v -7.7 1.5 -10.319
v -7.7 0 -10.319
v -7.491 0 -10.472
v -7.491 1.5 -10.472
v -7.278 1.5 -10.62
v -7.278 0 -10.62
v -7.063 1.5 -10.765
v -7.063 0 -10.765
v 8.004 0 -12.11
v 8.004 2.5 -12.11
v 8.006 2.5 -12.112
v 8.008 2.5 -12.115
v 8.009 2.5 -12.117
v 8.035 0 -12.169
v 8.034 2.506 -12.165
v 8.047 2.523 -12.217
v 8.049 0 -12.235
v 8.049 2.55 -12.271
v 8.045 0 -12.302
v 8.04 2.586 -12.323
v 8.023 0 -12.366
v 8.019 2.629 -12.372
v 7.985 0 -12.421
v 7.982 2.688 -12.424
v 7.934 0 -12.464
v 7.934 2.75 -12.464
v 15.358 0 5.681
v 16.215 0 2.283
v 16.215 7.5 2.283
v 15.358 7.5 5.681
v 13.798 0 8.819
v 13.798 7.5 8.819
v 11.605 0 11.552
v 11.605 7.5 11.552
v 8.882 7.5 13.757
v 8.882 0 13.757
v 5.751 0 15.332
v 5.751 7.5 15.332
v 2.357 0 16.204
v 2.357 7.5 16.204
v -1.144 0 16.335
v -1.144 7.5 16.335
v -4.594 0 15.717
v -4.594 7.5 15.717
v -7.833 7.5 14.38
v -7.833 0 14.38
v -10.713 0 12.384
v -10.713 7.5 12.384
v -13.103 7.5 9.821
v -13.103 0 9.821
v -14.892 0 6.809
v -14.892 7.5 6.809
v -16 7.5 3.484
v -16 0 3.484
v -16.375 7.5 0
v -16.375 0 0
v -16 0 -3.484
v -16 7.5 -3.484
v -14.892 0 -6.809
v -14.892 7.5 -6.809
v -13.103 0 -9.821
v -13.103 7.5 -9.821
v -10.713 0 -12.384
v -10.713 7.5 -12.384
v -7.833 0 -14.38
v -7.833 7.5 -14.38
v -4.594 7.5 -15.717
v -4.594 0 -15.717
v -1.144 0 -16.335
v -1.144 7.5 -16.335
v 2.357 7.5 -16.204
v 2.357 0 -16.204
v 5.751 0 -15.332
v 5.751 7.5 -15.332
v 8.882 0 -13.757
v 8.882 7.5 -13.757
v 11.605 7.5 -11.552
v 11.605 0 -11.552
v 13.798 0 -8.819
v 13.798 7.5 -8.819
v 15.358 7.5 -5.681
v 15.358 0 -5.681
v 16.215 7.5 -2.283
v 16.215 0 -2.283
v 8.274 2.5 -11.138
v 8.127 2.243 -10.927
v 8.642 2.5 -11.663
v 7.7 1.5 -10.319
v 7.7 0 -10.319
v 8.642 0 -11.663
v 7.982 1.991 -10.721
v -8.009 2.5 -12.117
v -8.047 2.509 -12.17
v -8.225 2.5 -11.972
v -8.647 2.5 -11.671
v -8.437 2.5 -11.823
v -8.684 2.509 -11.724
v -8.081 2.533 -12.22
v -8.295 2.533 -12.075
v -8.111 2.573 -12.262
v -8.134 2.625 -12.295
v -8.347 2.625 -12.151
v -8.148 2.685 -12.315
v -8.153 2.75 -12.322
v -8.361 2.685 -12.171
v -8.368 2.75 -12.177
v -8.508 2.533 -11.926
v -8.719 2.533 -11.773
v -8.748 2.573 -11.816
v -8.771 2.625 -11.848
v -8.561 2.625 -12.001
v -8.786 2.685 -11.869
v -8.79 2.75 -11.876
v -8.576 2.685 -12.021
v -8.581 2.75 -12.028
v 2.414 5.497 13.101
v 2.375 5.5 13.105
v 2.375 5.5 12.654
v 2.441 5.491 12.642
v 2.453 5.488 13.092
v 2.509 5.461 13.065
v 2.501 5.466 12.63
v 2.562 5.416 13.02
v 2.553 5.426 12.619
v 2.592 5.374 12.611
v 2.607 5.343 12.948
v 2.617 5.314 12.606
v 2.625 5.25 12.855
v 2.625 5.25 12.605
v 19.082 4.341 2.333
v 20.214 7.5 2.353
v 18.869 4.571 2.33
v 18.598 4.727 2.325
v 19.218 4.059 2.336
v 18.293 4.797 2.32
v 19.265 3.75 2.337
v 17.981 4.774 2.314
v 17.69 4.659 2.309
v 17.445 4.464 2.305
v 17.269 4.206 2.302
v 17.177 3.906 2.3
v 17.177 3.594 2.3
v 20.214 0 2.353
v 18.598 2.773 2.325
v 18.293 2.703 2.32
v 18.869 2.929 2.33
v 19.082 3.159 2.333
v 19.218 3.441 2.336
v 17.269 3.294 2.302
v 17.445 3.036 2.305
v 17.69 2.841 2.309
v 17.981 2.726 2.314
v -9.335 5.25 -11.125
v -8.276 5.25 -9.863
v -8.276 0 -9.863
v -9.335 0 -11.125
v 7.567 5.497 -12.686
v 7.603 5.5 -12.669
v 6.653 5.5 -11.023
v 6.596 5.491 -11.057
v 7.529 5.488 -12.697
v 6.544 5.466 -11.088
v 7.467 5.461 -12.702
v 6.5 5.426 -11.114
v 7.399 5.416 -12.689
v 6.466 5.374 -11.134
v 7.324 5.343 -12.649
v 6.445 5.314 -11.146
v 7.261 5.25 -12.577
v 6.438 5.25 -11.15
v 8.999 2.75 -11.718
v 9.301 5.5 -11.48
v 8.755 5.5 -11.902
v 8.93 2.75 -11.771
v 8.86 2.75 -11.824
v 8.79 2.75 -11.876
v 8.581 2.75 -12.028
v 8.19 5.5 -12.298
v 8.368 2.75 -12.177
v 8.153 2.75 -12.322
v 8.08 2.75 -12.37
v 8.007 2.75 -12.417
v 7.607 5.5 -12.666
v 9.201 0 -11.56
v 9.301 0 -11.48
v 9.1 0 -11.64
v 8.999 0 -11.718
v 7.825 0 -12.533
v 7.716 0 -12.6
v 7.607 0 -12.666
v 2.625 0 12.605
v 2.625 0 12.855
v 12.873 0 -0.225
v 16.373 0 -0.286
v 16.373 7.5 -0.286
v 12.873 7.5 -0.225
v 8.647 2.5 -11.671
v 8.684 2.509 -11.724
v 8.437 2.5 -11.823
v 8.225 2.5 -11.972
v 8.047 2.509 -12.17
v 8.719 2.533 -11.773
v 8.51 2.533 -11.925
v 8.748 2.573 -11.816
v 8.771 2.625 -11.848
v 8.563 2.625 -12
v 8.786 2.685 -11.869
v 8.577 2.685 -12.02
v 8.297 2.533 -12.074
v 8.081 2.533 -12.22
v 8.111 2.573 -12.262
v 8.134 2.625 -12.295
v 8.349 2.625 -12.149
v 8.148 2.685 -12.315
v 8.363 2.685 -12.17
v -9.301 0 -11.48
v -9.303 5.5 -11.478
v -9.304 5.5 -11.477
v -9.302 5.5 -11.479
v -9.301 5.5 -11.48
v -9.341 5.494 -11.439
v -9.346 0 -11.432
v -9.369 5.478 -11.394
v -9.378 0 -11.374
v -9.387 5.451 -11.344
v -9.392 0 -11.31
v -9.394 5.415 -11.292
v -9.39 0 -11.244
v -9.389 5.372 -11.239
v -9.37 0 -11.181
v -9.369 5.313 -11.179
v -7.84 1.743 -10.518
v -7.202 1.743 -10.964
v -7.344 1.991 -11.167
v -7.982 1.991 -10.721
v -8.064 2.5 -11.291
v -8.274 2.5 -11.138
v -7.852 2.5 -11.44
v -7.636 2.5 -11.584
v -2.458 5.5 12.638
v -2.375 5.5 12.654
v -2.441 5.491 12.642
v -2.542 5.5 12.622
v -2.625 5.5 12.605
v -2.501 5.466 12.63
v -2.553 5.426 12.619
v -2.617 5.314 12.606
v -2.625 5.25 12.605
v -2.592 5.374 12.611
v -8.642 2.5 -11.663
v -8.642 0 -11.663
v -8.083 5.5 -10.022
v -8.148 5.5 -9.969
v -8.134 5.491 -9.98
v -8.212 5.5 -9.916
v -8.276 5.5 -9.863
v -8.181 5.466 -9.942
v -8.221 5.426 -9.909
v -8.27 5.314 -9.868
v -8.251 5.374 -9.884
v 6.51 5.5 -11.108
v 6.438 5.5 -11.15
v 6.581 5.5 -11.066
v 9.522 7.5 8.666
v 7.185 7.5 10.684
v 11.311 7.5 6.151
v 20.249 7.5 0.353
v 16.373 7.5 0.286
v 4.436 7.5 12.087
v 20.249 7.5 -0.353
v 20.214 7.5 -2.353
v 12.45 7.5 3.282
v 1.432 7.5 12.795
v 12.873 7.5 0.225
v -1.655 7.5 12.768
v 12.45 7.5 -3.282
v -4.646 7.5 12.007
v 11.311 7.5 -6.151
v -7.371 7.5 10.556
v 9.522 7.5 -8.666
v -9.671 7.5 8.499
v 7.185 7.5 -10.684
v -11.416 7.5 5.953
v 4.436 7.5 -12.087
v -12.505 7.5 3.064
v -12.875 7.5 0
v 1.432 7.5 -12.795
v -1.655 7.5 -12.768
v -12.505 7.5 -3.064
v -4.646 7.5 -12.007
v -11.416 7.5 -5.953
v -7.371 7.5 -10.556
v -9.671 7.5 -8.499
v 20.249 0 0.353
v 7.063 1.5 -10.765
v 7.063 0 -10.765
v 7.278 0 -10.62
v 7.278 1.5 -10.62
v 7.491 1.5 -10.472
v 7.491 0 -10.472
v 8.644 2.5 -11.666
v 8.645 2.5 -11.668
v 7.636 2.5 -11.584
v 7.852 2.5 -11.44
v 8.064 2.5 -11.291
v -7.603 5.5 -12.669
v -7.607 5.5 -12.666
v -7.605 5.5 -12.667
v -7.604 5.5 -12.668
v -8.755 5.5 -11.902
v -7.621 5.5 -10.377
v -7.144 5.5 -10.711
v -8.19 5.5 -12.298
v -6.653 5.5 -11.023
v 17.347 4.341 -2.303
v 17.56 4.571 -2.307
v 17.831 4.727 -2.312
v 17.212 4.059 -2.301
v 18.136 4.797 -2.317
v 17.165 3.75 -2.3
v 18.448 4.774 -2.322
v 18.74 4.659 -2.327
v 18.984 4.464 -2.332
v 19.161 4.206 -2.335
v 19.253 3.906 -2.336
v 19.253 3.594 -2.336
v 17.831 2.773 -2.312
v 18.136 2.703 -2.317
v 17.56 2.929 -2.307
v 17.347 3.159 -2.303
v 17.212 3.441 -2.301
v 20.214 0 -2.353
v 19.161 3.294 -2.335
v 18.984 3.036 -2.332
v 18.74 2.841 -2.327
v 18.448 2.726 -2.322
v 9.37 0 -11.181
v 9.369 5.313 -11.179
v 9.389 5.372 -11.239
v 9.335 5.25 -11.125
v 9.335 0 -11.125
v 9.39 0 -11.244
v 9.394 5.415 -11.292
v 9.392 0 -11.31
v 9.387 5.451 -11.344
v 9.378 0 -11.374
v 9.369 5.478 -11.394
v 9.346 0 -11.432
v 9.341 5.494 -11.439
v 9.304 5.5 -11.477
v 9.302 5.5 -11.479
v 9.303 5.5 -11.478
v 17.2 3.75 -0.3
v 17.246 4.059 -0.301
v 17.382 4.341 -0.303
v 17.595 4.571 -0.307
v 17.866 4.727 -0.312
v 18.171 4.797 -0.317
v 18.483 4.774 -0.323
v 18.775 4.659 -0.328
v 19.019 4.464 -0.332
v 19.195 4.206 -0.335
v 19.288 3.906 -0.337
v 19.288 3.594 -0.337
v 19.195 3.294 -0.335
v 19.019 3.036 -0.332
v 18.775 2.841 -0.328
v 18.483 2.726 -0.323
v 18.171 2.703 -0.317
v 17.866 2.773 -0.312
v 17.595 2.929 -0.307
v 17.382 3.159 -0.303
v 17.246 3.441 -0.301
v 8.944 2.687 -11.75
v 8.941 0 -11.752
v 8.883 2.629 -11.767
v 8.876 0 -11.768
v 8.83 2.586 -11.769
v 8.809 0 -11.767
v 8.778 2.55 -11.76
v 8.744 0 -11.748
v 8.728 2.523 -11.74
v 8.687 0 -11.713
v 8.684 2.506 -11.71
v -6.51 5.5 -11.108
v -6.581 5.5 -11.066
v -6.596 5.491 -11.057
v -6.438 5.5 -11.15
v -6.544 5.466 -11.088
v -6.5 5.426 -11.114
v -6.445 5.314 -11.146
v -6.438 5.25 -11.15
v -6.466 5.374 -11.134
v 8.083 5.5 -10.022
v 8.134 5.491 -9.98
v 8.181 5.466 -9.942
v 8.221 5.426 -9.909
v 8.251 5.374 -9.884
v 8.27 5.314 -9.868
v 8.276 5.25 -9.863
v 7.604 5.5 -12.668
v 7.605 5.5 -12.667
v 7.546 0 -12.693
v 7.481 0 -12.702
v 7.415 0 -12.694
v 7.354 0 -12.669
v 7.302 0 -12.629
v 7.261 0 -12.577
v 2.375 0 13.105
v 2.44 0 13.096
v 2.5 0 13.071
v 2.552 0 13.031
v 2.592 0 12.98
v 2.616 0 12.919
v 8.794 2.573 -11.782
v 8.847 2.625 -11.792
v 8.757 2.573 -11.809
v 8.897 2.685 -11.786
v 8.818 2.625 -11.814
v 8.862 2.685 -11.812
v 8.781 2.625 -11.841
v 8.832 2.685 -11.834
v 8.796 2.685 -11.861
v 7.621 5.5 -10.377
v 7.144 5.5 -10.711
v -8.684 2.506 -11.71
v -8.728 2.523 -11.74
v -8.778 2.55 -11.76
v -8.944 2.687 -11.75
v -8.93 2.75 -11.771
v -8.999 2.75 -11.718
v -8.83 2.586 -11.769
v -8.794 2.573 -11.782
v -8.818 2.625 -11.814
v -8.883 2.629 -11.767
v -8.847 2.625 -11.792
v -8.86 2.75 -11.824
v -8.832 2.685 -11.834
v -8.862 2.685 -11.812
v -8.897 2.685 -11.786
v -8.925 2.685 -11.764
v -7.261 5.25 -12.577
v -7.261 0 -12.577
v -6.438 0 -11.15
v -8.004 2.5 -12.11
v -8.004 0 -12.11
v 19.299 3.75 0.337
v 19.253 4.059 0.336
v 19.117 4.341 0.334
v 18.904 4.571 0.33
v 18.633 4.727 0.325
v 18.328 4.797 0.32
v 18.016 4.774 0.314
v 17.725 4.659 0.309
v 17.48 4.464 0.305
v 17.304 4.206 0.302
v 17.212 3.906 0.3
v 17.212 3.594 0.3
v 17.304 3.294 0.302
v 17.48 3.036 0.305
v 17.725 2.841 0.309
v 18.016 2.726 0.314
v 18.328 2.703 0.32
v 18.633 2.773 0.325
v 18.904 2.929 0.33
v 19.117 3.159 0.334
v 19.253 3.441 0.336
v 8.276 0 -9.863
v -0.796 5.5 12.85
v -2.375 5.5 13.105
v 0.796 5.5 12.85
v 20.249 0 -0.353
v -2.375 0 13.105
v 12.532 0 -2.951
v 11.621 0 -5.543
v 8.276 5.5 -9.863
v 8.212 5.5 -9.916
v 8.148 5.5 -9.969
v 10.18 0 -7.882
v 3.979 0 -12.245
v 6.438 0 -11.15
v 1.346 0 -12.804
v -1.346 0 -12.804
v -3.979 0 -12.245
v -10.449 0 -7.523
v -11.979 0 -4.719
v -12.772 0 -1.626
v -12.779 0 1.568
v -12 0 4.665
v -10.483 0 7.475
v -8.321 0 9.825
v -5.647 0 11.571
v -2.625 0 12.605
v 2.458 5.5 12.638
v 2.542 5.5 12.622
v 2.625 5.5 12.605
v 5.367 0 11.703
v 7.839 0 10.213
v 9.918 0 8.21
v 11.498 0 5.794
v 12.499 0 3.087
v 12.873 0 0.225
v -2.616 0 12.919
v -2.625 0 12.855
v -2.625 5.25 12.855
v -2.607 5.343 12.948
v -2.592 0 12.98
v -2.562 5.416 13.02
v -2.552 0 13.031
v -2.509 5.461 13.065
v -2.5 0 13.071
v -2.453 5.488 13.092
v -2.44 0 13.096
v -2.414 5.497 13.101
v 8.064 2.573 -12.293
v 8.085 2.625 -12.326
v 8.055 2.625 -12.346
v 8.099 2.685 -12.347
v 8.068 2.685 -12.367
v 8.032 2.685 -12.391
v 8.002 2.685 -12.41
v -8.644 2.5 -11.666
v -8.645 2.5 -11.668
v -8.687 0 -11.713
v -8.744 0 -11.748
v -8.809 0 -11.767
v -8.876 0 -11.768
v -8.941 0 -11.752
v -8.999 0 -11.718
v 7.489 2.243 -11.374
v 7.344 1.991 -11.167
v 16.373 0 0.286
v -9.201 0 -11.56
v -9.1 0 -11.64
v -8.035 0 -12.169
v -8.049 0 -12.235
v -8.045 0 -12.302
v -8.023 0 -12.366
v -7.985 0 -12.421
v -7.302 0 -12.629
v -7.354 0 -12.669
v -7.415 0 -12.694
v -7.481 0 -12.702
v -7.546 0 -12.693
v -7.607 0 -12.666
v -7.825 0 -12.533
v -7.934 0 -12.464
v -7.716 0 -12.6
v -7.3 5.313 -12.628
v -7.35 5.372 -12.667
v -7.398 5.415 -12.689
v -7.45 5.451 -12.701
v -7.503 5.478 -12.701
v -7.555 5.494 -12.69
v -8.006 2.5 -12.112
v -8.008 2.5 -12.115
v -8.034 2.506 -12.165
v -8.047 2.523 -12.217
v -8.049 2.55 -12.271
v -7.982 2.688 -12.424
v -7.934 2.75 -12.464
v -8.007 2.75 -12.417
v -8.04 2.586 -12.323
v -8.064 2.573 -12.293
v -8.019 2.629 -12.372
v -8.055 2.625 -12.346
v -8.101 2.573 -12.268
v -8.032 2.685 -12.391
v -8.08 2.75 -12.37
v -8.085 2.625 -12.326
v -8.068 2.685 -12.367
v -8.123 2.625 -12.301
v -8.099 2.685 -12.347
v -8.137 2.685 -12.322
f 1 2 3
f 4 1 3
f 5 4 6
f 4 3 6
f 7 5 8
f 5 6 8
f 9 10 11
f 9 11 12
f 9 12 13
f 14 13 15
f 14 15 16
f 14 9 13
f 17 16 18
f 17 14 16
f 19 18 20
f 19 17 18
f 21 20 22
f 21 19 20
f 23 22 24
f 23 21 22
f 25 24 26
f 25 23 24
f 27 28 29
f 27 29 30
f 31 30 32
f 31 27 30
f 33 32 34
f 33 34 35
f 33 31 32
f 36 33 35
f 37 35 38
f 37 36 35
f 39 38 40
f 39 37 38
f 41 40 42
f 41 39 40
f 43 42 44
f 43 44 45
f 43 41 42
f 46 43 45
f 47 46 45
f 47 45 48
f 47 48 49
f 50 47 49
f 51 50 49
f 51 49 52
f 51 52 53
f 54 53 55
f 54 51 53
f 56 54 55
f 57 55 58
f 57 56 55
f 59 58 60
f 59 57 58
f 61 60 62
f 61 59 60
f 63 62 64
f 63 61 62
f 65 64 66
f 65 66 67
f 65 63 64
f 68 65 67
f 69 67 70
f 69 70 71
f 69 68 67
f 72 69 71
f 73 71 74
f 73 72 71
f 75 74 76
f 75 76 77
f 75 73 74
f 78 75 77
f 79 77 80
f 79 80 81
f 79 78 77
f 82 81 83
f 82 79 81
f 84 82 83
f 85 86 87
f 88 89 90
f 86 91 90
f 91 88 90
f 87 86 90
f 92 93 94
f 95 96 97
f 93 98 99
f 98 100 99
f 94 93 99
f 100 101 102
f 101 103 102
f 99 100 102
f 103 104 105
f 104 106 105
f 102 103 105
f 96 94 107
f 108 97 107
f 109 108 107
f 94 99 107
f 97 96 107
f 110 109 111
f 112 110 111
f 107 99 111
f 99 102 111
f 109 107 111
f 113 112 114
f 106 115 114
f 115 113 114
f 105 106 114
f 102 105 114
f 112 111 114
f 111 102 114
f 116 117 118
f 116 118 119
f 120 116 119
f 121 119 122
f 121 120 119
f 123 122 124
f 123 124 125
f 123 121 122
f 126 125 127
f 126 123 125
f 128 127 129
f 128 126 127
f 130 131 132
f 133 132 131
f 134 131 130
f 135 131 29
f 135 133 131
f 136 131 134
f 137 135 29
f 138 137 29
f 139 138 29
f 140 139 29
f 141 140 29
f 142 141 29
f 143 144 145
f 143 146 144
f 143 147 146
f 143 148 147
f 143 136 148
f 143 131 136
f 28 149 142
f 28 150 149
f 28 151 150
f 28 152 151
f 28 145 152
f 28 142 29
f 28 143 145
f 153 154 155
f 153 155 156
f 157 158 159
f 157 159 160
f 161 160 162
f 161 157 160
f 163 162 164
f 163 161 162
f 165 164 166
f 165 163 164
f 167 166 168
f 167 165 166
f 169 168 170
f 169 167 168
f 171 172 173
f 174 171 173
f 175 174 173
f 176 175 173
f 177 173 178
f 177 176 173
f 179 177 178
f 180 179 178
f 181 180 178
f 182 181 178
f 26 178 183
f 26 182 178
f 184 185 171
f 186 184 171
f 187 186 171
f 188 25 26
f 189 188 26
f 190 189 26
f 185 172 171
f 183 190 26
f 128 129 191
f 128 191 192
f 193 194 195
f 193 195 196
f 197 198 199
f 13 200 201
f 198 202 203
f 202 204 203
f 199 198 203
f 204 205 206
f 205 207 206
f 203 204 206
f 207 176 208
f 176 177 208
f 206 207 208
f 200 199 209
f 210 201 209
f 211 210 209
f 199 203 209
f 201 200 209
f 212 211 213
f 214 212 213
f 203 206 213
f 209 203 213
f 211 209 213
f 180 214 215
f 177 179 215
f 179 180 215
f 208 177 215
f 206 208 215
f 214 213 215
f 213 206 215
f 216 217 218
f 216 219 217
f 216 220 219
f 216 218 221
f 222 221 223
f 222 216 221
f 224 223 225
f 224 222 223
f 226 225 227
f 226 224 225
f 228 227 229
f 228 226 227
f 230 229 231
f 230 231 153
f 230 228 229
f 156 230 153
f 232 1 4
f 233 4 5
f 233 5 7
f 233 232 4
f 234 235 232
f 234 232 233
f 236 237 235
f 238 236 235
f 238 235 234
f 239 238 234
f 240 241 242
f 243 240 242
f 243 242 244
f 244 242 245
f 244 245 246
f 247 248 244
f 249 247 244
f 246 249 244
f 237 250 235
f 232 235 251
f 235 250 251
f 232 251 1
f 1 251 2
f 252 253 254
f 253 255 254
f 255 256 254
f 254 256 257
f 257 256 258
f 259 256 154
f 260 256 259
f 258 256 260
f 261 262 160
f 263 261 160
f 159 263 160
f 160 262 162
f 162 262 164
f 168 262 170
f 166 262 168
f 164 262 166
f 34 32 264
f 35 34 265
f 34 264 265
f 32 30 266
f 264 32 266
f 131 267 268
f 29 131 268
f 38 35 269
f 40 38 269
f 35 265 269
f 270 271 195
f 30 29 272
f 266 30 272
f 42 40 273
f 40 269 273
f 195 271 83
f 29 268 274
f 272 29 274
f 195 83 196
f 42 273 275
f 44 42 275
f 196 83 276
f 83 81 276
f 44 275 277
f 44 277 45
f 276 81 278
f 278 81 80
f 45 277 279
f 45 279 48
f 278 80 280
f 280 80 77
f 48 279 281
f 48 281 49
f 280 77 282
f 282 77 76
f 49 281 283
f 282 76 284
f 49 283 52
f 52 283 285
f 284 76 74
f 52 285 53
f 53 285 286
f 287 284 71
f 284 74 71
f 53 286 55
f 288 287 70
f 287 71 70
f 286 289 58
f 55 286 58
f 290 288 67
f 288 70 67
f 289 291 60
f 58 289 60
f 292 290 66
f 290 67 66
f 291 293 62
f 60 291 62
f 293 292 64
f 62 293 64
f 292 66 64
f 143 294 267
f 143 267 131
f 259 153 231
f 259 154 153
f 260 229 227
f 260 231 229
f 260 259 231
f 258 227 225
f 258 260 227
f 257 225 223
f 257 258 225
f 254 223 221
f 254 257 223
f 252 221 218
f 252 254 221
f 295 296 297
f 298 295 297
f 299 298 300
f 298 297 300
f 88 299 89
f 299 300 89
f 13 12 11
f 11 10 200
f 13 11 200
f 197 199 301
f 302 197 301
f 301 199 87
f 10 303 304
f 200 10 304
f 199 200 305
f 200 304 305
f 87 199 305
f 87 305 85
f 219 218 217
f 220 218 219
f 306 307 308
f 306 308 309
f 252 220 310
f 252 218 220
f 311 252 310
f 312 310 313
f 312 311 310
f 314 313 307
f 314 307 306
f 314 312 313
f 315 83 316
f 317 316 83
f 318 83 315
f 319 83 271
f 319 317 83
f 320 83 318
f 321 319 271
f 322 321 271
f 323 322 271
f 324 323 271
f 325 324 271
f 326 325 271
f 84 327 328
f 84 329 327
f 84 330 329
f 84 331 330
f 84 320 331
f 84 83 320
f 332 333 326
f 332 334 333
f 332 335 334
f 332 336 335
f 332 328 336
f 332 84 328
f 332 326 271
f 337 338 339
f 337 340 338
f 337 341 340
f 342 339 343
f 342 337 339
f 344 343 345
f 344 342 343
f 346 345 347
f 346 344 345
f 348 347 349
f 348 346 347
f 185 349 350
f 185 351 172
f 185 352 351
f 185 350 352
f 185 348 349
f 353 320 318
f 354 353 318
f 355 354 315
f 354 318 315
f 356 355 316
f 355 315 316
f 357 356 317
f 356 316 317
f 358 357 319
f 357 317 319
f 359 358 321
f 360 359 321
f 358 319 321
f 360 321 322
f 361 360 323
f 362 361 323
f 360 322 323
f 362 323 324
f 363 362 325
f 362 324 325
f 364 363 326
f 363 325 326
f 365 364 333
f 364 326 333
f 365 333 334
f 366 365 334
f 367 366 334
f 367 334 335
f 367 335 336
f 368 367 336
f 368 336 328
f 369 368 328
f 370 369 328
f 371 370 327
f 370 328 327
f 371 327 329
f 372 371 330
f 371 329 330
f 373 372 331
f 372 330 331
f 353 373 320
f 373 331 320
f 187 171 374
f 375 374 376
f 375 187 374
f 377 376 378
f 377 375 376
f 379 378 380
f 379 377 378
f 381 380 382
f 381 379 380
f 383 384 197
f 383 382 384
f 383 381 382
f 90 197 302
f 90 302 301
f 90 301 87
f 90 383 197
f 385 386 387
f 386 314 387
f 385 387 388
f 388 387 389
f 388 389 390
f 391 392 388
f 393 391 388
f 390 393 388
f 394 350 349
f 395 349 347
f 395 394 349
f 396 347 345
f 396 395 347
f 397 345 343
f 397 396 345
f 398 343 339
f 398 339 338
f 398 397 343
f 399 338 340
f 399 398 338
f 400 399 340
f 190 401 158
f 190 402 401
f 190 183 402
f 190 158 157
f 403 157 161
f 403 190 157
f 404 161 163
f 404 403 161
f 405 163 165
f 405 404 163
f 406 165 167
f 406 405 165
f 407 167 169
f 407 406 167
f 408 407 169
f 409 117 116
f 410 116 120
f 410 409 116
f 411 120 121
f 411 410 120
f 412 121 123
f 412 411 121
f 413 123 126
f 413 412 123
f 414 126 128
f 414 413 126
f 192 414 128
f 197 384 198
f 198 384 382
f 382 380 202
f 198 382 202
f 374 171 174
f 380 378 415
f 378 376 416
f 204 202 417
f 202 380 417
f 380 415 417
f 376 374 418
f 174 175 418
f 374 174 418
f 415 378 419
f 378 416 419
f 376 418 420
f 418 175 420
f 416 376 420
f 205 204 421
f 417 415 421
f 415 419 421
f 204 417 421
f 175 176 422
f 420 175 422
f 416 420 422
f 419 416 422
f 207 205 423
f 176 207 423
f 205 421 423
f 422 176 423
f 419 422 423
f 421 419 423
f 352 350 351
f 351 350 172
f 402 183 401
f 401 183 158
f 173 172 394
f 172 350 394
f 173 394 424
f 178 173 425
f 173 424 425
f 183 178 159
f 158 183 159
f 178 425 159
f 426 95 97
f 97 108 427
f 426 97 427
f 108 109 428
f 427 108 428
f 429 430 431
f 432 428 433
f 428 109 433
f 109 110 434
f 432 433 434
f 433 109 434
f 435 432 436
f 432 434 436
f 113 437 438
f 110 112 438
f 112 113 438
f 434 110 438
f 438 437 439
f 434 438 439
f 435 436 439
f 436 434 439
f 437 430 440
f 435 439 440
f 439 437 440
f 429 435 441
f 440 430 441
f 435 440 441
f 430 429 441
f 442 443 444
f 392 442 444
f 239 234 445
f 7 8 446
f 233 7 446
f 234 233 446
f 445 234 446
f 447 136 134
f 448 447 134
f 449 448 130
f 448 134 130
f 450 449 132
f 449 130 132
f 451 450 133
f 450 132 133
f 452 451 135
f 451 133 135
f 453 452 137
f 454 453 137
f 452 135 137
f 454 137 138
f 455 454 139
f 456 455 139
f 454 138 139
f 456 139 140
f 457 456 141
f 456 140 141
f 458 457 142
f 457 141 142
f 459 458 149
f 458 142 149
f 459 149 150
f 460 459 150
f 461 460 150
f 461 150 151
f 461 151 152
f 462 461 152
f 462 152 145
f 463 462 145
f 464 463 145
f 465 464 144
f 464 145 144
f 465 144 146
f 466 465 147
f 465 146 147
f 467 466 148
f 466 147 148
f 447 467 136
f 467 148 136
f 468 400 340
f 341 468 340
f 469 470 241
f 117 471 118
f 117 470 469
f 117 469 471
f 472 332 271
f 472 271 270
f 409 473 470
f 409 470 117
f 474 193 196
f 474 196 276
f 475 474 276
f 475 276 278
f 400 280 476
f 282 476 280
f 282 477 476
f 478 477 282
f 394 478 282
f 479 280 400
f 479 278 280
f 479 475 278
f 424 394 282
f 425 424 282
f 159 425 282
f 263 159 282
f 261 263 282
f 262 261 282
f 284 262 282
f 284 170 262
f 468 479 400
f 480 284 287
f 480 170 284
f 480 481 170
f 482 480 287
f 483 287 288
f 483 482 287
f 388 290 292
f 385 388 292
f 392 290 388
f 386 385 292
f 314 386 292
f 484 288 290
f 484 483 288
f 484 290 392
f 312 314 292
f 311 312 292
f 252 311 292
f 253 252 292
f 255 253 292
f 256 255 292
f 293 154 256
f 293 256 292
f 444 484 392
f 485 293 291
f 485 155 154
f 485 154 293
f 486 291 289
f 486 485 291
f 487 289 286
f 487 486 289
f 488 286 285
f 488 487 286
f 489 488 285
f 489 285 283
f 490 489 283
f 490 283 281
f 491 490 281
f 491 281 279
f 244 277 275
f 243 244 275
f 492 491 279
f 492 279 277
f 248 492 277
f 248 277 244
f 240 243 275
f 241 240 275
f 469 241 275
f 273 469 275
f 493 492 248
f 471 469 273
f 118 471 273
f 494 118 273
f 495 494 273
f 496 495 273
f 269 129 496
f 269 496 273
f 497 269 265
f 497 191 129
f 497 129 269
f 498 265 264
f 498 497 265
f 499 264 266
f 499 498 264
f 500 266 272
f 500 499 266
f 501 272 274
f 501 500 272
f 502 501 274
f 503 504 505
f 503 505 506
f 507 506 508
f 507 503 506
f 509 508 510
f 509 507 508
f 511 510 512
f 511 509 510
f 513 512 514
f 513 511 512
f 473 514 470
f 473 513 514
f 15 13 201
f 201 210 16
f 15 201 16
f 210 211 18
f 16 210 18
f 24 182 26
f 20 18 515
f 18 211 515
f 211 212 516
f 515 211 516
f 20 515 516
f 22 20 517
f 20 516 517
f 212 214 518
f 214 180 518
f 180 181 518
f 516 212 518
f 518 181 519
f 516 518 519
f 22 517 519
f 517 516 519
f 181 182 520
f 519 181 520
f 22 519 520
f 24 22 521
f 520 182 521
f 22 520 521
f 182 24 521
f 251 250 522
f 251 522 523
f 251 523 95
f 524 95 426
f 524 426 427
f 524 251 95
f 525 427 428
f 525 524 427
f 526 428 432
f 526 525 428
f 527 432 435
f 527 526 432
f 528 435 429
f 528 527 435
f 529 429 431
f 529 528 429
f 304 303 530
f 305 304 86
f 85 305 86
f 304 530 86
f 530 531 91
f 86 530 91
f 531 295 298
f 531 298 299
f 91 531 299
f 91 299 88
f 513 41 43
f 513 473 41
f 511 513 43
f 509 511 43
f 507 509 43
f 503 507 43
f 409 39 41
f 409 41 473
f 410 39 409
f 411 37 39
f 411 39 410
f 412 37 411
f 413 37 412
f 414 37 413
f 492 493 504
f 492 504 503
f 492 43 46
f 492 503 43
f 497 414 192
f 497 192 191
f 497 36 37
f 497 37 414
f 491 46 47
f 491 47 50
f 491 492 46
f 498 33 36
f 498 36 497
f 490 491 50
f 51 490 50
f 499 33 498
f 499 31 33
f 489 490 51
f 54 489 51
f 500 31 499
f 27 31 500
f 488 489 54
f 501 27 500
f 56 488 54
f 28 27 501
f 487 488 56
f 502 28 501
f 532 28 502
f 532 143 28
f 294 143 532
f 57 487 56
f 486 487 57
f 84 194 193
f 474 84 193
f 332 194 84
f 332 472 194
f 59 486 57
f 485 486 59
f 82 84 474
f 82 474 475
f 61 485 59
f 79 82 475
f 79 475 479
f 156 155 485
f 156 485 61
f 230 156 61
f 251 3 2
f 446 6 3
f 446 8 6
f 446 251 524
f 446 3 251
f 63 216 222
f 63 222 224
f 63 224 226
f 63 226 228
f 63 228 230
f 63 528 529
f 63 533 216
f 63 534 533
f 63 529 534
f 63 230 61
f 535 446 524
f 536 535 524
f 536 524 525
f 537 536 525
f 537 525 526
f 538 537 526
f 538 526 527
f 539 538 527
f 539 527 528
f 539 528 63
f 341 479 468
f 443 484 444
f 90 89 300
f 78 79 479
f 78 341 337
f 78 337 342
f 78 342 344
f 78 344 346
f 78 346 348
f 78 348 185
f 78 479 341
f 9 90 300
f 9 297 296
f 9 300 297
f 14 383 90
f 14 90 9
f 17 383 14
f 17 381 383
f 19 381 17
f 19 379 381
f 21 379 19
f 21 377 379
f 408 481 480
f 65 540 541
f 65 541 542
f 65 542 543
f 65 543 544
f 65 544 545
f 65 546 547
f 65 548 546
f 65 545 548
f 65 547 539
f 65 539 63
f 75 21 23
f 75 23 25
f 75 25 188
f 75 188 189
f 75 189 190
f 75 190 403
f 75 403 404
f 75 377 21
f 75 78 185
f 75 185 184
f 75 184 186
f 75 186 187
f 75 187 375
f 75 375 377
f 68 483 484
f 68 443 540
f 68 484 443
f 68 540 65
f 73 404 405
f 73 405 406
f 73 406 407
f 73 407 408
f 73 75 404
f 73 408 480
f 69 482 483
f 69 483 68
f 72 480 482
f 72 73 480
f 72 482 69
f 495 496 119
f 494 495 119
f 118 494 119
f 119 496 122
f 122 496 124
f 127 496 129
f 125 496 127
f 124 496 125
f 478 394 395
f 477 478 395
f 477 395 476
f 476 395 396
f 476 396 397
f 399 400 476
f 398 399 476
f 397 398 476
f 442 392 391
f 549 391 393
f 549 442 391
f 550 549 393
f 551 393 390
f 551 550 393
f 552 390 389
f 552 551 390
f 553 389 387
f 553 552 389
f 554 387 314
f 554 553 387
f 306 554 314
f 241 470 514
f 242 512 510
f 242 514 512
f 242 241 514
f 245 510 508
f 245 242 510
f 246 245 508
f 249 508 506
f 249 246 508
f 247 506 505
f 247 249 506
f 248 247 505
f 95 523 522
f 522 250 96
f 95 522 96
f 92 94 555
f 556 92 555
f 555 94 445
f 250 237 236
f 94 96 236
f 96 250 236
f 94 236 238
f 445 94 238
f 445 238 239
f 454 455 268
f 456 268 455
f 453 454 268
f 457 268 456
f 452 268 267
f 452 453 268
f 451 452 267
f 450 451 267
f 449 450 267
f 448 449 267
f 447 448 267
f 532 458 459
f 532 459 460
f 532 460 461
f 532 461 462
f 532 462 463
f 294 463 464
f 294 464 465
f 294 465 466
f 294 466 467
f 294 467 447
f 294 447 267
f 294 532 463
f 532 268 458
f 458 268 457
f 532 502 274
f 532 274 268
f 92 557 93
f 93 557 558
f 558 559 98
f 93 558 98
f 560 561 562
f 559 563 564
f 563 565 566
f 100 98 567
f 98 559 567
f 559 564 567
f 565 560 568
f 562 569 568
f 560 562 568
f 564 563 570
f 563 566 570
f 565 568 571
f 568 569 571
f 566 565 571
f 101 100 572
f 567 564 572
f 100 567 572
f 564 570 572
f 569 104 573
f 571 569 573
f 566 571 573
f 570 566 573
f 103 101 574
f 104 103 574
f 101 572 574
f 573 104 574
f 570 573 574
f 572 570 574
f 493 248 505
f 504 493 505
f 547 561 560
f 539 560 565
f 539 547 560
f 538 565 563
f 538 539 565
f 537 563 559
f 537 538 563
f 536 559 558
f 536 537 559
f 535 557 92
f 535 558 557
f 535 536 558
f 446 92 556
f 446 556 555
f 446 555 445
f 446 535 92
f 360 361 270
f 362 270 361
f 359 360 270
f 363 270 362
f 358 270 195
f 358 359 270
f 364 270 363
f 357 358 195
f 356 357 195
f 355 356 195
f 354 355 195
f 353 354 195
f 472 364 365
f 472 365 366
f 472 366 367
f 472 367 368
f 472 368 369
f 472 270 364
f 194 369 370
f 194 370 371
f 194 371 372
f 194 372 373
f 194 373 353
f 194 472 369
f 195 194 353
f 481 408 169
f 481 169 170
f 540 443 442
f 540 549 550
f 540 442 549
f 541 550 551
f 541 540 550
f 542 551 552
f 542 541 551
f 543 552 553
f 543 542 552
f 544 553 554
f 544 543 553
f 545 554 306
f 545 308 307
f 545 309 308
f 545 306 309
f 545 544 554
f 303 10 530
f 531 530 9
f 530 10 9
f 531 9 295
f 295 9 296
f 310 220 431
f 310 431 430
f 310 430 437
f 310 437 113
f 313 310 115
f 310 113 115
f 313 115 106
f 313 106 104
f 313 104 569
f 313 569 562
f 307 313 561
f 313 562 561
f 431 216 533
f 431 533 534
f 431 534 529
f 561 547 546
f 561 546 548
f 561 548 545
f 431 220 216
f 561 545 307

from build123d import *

# Parameters (mm, degrees)
BOSS_EXTRUDE1_DEPTH = 7.5
SKETCH2_R           = 1.05
CUT_EXTRUDE1_DEPTH  = 2
SKETCH3_R           = 1.05
CUT_EXTRUDE2_DEPTH  = 2
SKETCH4_W           = 5.25
SKETCH4_H           = 0.5
CUT_EXTRUDE3_DEPTH  = 5.5
BOSS_EXTRUDE2_DEPTH = 2.5
FILLET1_R           = 0.25
CHAMFER1_SIZE       = 1


with BuildPart() as part:
    # Sketch1 → Boss-Extrude1 (new body)
    with BuildSketch(Plane(origin=(0, 0, 0), x_dir=(1, 0, 0), z_dir=(0, 1, 0))):
        with BuildLine():
            Line((16.215023536, 2.283338945), (20.214414316, 2.35314857))
            Line((20.214414316, 2.35314857), (20.249319129, 0.35345318))
            Line((20.249319129, 0.35345318), (16.372506008, 0.285783155))
            Line((16.372506008, 0.285783155), (12.873039075, 0.224699733))
            ThreePointArc((12.873039075, 0.224699733), (-12.875, 0), (12.873039075, -0.224699733))
            Line((12.873039075, -0.224699733), (16.372506008, -0.285783155))
            Line((16.372506008, -0.285783155), (20.249319129, -0.35345318))
            Line((20.249319129, -0.35345318), (20.214414316, -2.35314857))
            Line((20.214414316, -2.35314857), (16.215023536, -2.283338945))
            ThreePointArc((16.215023536, -2.283338945), (-16.375, 0), (16.215023536, 2.283338945))
        make_face()
    extrude(amount=BOSS_EXTRUDE1_DEPTH)

    # Sketch2 → Cut-Extrude1 (cut)
    with BuildSketch(Plane(origin=(-0.034904813, 0, 1.99969539), x_dir=(0.9998476951563915, 0, 0.01745240643727699), z_dir=(-0.01745240643727699, 0, 0.9998476951563915))):
        with Locations((18.252403668, 3.75)):
            Circle(SKETCH2_R)
    extrude(amount=-CUT_EXTRUDE1_DEPTH, mode=Mode.SUBTRACT)

    # Sketch3 → Cut-Extrude2 (cut)
    with BuildSketch(Plane(origin=(-0.034904813, 0, -1.99969539), x_dir=(-0.9998476951563915, 0, 0.01745240643727699), z_dir=(-0.01745240643727699, 0, -0.9998476951563915))):
        with Locations((-18.252403668, 3.75)):
            Circle(SKETCH3_R)
    extrude(amount=-CUT_EXTRUDE2_DEPTH, mode=Mode.SUBTRACT)

    # Sketch4 → Cut-Extrude3 (cut)
    with BuildSketch(Plane.XZ):
        with BuildLine():
            Line((-8.275890475, -9.862822205), (-9.497186933, -11.318306647))
            ThreePointArc((-9.497186933, -11.318306647), (-8.474591847, -12.102971454), (-7.3875, -12.795525341))
            Line((-7.3875, -12.795525341), (-6.4375, -11.150077074))
            ThreePointArc((-6.4375, -11.150077074), (-7.384796618, -10.54658257), (-8.275890475, -9.862822205))
        make_face()
        with BuildLine():
            Line((8.275890475, -9.862822205), (9.497186933, -11.318306647))
            ThreePointArc((9.497186933, -11.318306647), (8.474591847, -12.102971454), (7.3875, -12.795525341))
            Line((7.3875, -12.795525341), (6.4375, -11.150077074))
            ThreePointArc((6.4375, -11.150077074), (7.384796618, -10.54658257), (8.275890475, -9.862822205))
        make_face()
        with Locations((0, 12.854562666)):
            Rectangle(SKETCH4_W, SKETCH4_H)
    extrude(amount=-CUT_EXTRUDE3_DEPTH, mode=Mode.SUBTRACT)

    # Sketch5 → Boss-Extrude2 (add)
    with BuildSketch(Plane.XZ):
        with BuildLine():
            Line((8.152855692, -12.321995336), (7.062626355, -10.764986482))
            ThreePointArc((7.062626355, -10.764986482), (7.384796618, -10.54658257), (7.700217882, -10.318540089))
            Line((7.700217882, -10.318540089), (8.790447219, -11.875548943))
            ThreePointArc((8.790447219, -11.875548943), (8.474591847, -12.102971454), (8.152855692, -12.321995336))
        make_face()
        with BuildLine():
            Line((-8.790447219, -11.875548943), (-7.700217882, -10.318540089))
            ThreePointArc((-7.700217882, -10.318540089), (-7.384796618, -10.54658257), (-7.062626355, -10.764986482))
            Line((-7.062626355, -10.764986482), (-8.152855692, -12.321995336))
            ThreePointArc((-8.152855692, -12.321995336), (-8.474591847, -12.102971454), (-8.790447219, -11.875548943))
        make_face()
    extrude(amount=-BOSS_EXTRUDE2_DEPTH)

    # Fillet1
    # the kernel refuses this fillet: 0.25 mm, written as the material it adds along each edge
    with BuildSketch(Plane(origin=(0, 2.5, 0), x_dir=(0.62841176473142, 0, -0.777880873879248), z_dir=(0.777880873879248, 0, 0.62841176473142))) as fillet1_piece_1_section:
        with BuildLine():
            CenterArc((14.775 - FILLET1_R, FILLET1_R), FILLET1_R, 270, 90)
            Line((14.775 - FILLET1_R, 0), (14.775, 0))
            Line((14.775, 0), (14.775, FILLET1_R))
        make_face()
    fillet1_piece_1 = revolve(axis=Axis((0, 2.5, 0), (0, 1, 0)), revolution_arc=7.866084762, mode=Mode.PRIVATE)
    fillet1_piece_1 = split(fillet1_piece_1, bisect_by=Plane(origin=(8.759939705, 2.55659864, -11.831979697), z_dir=(-0.8191520442889932, 0, -0.573576436351044)), keep=Keep.TOP, mode=Mode.PRIVATE)
    fillet1_piece_1 = split(fillet1_piece_1, bisect_by=Plane(origin=(8.122348177, 2.55659864, -12.278426091), z_dir=(0.8191520442889957, 0, 0.5735764363510407)), keep=Keep.TOP, mode=Mode.PRIVATE)
    add(fillet1_piece_1)
    with BuildSketch(Plane(origin=(8.790447219, 0, -11.875548943), x_dir=(0.7984700606490586, 0, 0.6020345191491006), z_dir=(0, 1, 0)), Plane(origin=(-8.152855692, 0, -12.321995336), x_dir=(0.8388202396872455, 0, -0.5444084913840267), z_dir=(0, 1, 0))) as fillet1_piece_2:
        with BuildLine():
            CenterArc((0.258953447, -0.249990236), FILLET1_R, 89.493613217, 92.522135515)
            Line((0.009108148, -0.258783785), (0, 0))
            ThreePointArc((0, 0), (0.130581474, 0.000577051), (0.261162947, 0))
        make_face()
    extrude(amount=2.5)
    with BuildSketch(Plane(origin=(8.152855692, 0, -12.321995336), x_dir=(-0.8388202396872467, 0, -0.5444084913840251), z_dir=(0, 1, 0)), Plane(origin=(-8.790447219, 0, -11.875548943), x_dir=(-0.7984700606490618, 0, 0.6020345191490962), z_dir=(0, 1, 0))) as fillet1_piece_3:
        with BuildLine():
            CenterArc((0.258953447, 0.249990236), FILLET1_R, 177.984251268, 92.522135515)
            Line((0.009108148, 0.258783785), (0, 0))
            ThreePointArc((0, 0), (0.130581474, -0.000577051), (0.261162947, 0))
        make_face()
    extrude(amount=2.5)
    with BuildSketch(Plane(origin=(-2.625, 5.5, 11.979562666), x_dir=(0, -1, 0), z_dir=(0, 0, 1))) as fillet1_piece_4_section:
        with BuildLine():
            CenterArc((FILLET1_R, FILLET1_R), FILLET1_R, 180, 90)
            Line((0, FILLET1_R), (0, 0))
            Line((0, 0), (FILLET1_R, 0))
        make_face()
    fillet1_piece_4 = extrude(amount=1.75, mode=Mode.PRIVATE)
    fillet1_piece_4 = fillet1_piece_4 - Plane(origin=(0, 5.442690928, 0), x_dir=(0.9998476951563914, 0, -0.01745240643727672), z_dir=(0, -1, 0)) * Cylinder(12.875, 5, mode=Mode.PRIVATE)
    add(fillet1_piece_4)
    with BuildSketch(Plane(origin=(-2.625, 0, 13.104562666), x_dir=(1, 0, 0), z_dir=(0, 1, 0)), Plane(origin=(2.625, 0, 13.104562666), x_dir=(0, 0, -1), z_dir=(0, 1, 0))) as fillet1_piece_5:
        with BuildLine():
            CenterArc((FILLET1_R, FILLET1_R), FILLET1_R, 180, 90)
            Line((0, FILLET1_R), (0, 0))
            Line((0, 0), (FILLET1_R, 0))
        make_face()
    extrude(amount=6.125)
    with BuildSketch(Plane(origin=(2.625, 5.5, 13.729562666), x_dir=(0, -1, 0), z_dir=(0, 0, -1))) as fillet1_piece_6_section:
        with BuildLine():
            CenterArc((FILLET1_R, FILLET1_R), FILLET1_R, 180, 90)
            Line((0, FILLET1_R), (0, 0))
            Line((0, 0), (FILLET1_R, 0))
        make_face()
    fillet1_piece_6 = extrude(amount=1.75, mode=Mode.PRIVATE)
    fillet1_piece_6 = fillet1_piece_6 - Plane(origin=(0, 5.443401221, 0), x_dir=(0.9998476951563914, 0, -0.01745240643727672), z_dir=(0, -1, 0)) * Cylinder(12.875, 5, mode=Mode.PRIVATE)
    add(fillet1_piece_6)
    with BuildSketch(Plane(origin=(-7.7, 5.5, -13.336791218), x_dir=(0, -1, 0), z_dir=(0.4999999999999989, 0, 0.8660254037844394))) as fillet1_piece_7_section:
        with BuildLine():
            CenterArc((FILLET1_R, -FILLET1_R), FILLET1_R, 90, 90)
            Line((0, -FILLET1_R), (0, 0))
            Line((0, 0), (FILLET1_R, 0))
        make_face()
    fillet1_piece_7 = extrude(amount=3.15, mode=Mode.PRIVATE)
    fillet1_piece_7 = fillet1_piece_7 - Plane(origin=(0, 5.443414893, 0), x_dir=(0.9998476951563914, 0, -0.01745240643727672), z_dir=(0, -1, 0)) * Cylinder(12.875, 8, mode=Mode.PRIVATE)
    add(fillet1_piece_7)
    with BuildSketch(Plane(origin=(-7.3875, 0, -12.795525341), x_dir=(-0.8616902462472484, 0, 0.5074346455676397), z_dir=(0, 1, 0)), Plane(origin=(9.497186933, 0, -11.318306647), x_dir=(-0.7715480134948484, 0, -0.6361710955962662), z_dir=(0, 1, 0))) as fillet1_piece_8:
        with BuildLine():
            CenterArc((0.252160801, 0.249990742), FILLET1_R, 179.506896654, 90.986206692)
            Line((0.00217006, 0.252142284), (0, 0))
            ThreePointArc((0, 0), (0.127156172, -0.000547174), (0.254312344, 0))
        make_face()
    extrude(amount=6.13578086)
    with BuildSketch(Plane(origin=(-7.874148219, 5.5, -9.384044428), x_dir=(0, -1, 0), z_dir=(-0.6427876096865357, 0, -0.7660444431189812))) as fillet1_piece_9_section:
        with BuildLine():
            CenterArc((FILLET1_R, -FILLET1_R), FILLET1_R, 90, 90)
            Line((0, -FILLET1_R), (0, 0))
            Line((0, 0), (FILLET1_R, 0))
        make_face()
    fillet1_piece_9 = extrude(amount=3.15, mode=Mode.PRIVATE)
    fillet1_piece_9 = fillet1_piece_9 - Plane(origin=(0, 5.443401887, 0), x_dir=(0.9998476951563914, 0, -0.01745240643727672), z_dir=(0, -1, 0)) * Cylinder(12.875, 8, mode=Mode.PRIVATE)
    add(fillet1_piece_9)
    with BuildSketch(Plane(origin=(-9.497186933, 0, -11.318306647), x_dir=(0.6427876096865356, 0, 0.7660444431189811), z_dir=(0, 1, 0)), Plane(origin=(7.3875, 0, -12.795525341), x_dir=(-0.499999999999998, 0, 0.8660254037844396), z_dir=(0, 1, 0))) as fillet1_piece_10:
        with BuildLine():
            CenterArc((0.252151622, 0.25), FILLET1_R, 179.013793308, 90.986206692)
            ThreePointArc((0.002188655, 0.254302926), (0.000547174, 0.127156172), (0, 0))
            Line((0, 0), (0.252151622, 0))
        make_face()
    extrude(amount=6.13578086)
    with BuildSketch(Plane(origin=(7.874148219, 5.5, -9.384044428), x_dir=(0, -1, 0), z_dir=(0.6427876096865357, 0, -0.7660444431189812))) as fillet1_piece_11_section:
        with BuildLine():
            CenterArc((FILLET1_R, FILLET1_R), FILLET1_R, 180, 90)
            Line((0, FILLET1_R), (0, 0))
            Line((0, 0), (FILLET1_R, 0))
        make_face()
    fillet1_piece_11 = extrude(amount=3.15, mode=Mode.PRIVATE)
    fillet1_piece_11 = fillet1_piece_11 - Plane(origin=(0, 5.443401886, 0), x_dir=(0.9998476951563914, 0, -0.01745240643727672), z_dir=(0, -1, 0)) * Cylinder(12.875, 8, mode=Mode.PRIVATE)
    add(fillet1_piece_11)
    with BuildSketch(Plane(origin=(7.7, 5.5, -13.336791218), x_dir=(0, -1, 0), z_dir=(-0.4999999999999989, 0, 0.8660254037844394))) as fillet1_piece_12_section:
        with BuildLine():
            CenterArc((FILLET1_R, FILLET1_R), FILLET1_R, 180, 90)
            Line((0, FILLET1_R), (0, 0))
            Line((0, 0), (FILLET1_R, 0))
        make_face()
    fillet1_piece_12 = extrude(amount=3.15, mode=Mode.PRIVATE)
    fillet1_piece_12 = fillet1_piece_12 - Plane(origin=(0, 5.443414893, 0), x_dir=(0.9998476951563914, 0, -0.01745240643727672), z_dir=(0, -1, 0)) * Cylinder(12.875, 8, mode=Mode.PRIVATE)
    add(fillet1_piece_12)
    with BuildSketch(Plane(origin=(0, 2.5, 0), x_dir=(-0.5160394351938659, 0, -0.856564826107631), z_dir=(0.856564826107631, 0, -0.5160394351938659))) as fillet1_piece_13_section:
        with BuildLine():
            CenterArc((14.775 - FILLET1_R, FILLET1_R), FILLET1_R, 270, 90)
            Line((14.775 - FILLET1_R, 0), (14.775, 0))
            Line((14.775, 0), (14.775, FILLET1_R))
        make_face()
    fillet1_piece_13 = revolve(axis=Axis((0, 2.5, 0), (0, 1, 0)), revolution_arc=7.866084762, mode=Mode.PRIVATE)
    fillet1_piece_13 = split(fillet1_piece_13, bisect_by=Plane(origin=(-8.759939705, 2.55659864, -11.831979697), z_dir=(0.8191520442889937, 0, -0.5735764363510434)), keep=Keep.TOP, mode=Mode.PRIVATE)
    fillet1_piece_13 = split(fillet1_piece_13, bisect_by=Plane(origin=(-8.122348177, 2.55659864, -12.278426091), z_dir=(-0.8191520442889957, 0, 0.5735764363510407)), keep=Keep.TOP, mode=Mode.PRIVATE)
    add(fillet1_piece_13)
    with BuildSketch(Plane(origin=(8.790447219, 0, -11.875548943), x_dir=(0.7984700606490586, 0, 0.6020345191491006), z_dir=(0, 1, 0))) as fillet1_piece_14a_section:
        with BuildLine():
            CenterArc((0.258953447, -0.249990236), FILLET1_R, 89.493613217, 92.522135515)
            Line((0.009108148, -0.258783785), (0, 0))
            ThreePointArc((0, 0), (0.130581474, 0.000577051), (0.261162947, 0))
        make_face()
    fillet1_piece_14a = extrude(amount=3.152907368, mode=Mode.PRIVATE)
    fillet1_piece_14a = split(fillet1_piece_14a, bisect_by=Plane(origin=(8.804363414, 2.5, -11.791834309), z_dir=(0, 1, 0)), keep=Keep.TOP, mode=Mode.PRIVATE)
    with BuildSketch(Plane(origin=(0, 2.5, 0), x_dir=(0.62841176473142, 0, -0.777880873879248), z_dir=(0.777880873879248, 0, 0.62841176473142))) as fillet1_piece_14b_section:
        with BuildLine():
            CenterArc((14.775 - FILLET1_R, FILLET1_R), FILLET1_R, 270, 90)
            Line((14.775 - FILLET1_R, 0), (14.775, 0))
            Line((14.775, 0), (14.775, FILLET1_R))
        make_face()
    fillet1_piece_14b = revolve(axis=Axis((0, 2.5, 0), (0, 1, 0)), revolution_arc=7.866084762, mode=Mode.PRIVATE)
    fillet1_piece_14b = split(fillet1_piece_14b, bisect_by=Plane(origin=(8.750942177, 2.556788389, -11.819129896), z_dir=(0.8191520442889932, 0, 0.573576436351044)), keep=Keep.TOP, mode=Mode.PRIVATE)
    fillet1_piece_14 = fillet1_piece_14a & fillet1_piece_14b
    add(fillet1_piece_14)
    with BuildSketch(Plane(origin=(0, 2.5, 0), x_dir=(0.62841176473142, 0, -0.777880873879248), z_dir=(0.777880873879248, 0, 0.62841176473142))) as fillet1_piece_15a_section:
        with BuildLine():
            CenterArc((14.775 - FILLET1_R, FILLET1_R), FILLET1_R, 270, 90)
            Line((14.775 - FILLET1_R, 0), (14.775, 0))
            Line((14.775, 0), (14.775, FILLET1_R))
        make_face()
    fillet1_piece_15a = revolve(axis=Axis((0, 2.5, 0), (0, 1, 0)), revolution_arc=7.866084762, mode=Mode.PRIVATE)
    fillet1_piece_15a = split(fillet1_piece_15a, bisect_by=Plane(origin=(8.113350762, 2.556788399, -12.26557645), z_dir=(-0.8191520442889957, 0, -0.5735764363510407)), keep=Keep.TOP, mode=Mode.PRIVATE)
    with BuildSketch(Plane(origin=(8.152855692, 0, -12.321995336), x_dir=(-0.8388202396872467, 0, -0.5444084913840251), z_dir=(0, 1, 0))) as fillet1_piece_15b_section:
        with BuildLine():
            CenterArc((0.258953447, 0.249990236), FILLET1_R, 177.984251268, 92.522135515)
            Line((0.009108148, 0.258783785), (0, 0))
            ThreePointArc((0, 0), (0.130581474, -0.000577051), (0.261162947, 0))
        make_face()
    fillet1_piece_15b = extrude(amount=3.152907368, mode=Mode.PRIVATE)
    fillet1_piece_15b = split(fillet1_piece_15b, bisect_by=Plane(origin=(8.069430049, 2.5, -12.306440191), z_dir=(0, 1, 0)), keep=Keep.TOP, mode=Mode.PRIVATE)
    fillet1_piece_15 = fillet1_piece_15a & fillet1_piece_15b
    add(fillet1_piece_15)
    with BuildSketch(Plane(origin=(0, 2.5, 0), x_dir=(-0.5160394351938659, 0, -0.856564826107631), z_dir=(0.856564826107631, 0, -0.5160394351938659))) as fillet1_piece_16a_section:
        with BuildLine():
            CenterArc((14.775 - FILLET1_R, FILLET1_R), FILLET1_R, 270, 90)
            Line((14.775 - FILLET1_R, 0), (14.775, 0))
            Line((14.775, 0), (14.775, FILLET1_R))
        make_face()
    fillet1_piece_16a = revolve(axis=Axis((0, 2.5, 0), (0, 1, 0)), revolution_arc=7.866084762, mode=Mode.PRIVATE)
    fillet1_piece_16a = split(fillet1_piece_16a, bisect_by=Plane(origin=(-8.11335065, 2.556788389, -12.26557629), z_dir=(0.8191520442889957, 0, -0.5735764363510407)), keep=Keep.TOP, mode=Mode.PRIVATE)
    with BuildSketch(Plane(origin=(-8.152855692, 0, -12.321995336), x_dir=(0.8388202396872455, 0, -0.5444084913840267), z_dir=(0, 1, 0))) as fillet1_piece_16b_section:
        with BuildLine():
            CenterArc((0.258953447, -0.249990236), FILLET1_R, 89.493613217, 92.522135515)
            Line((0.009108148, -0.258783785), (0, 0))
            ThreePointArc((0, 0), (0.130581474, 0.000577051), (0.261162947, 0))
        make_face()
    fillet1_piece_16b = extrude(amount=3.152907368, mode=Mode.PRIVATE)
    fillet1_piece_16b = split(fillet1_piece_16b, bisect_by=Plane(origin=(-8.069430049, 2.5, -12.306440191), z_dir=(0, 1, 0)), keep=Keep.TOP, mode=Mode.PRIVATE)
    fillet1_piece_16 = fillet1_piece_16a & fillet1_piece_16b
    add(fillet1_piece_16)
    with BuildSketch(Plane(origin=(-8.790447219, 0, -11.875548943), x_dir=(-0.7984700606490618, 0, 0.6020345191490962), z_dir=(0, 1, 0))) as fillet1_piece_17a_section:
        with BuildLine():
            CenterArc((0.258953447, 0.249990236), FILLET1_R, 177.984251268, 92.522135515)
            Line((0.009108148, 0.258783785), (0, 0))
            ThreePointArc((0, 0), (0.130581474, -0.000577051), (0.261162947, 0))
        make_face()
    fillet1_piece_17a = extrude(amount=3.152907368, mode=Mode.PRIVATE)
    fillet1_piece_17a = split(fillet1_piece_17a, bisect_by=Plane(origin=(-8.804363414, 2.5, -11.791834309), z_dir=(0, 1, 0)), keep=Keep.TOP, mode=Mode.PRIVATE)
    with BuildSketch(Plane(origin=(0, 2.5, 0), x_dir=(-0.5160394351938659, 0, -0.856564826107631), z_dir=(0.856564826107631, 0, -0.5160394351938659))) as fillet1_piece_17b_section:
        with BuildLine():
            CenterArc((14.775 - FILLET1_R, FILLET1_R), FILLET1_R, 270, 90)
            Line((14.775 - FILLET1_R, 0), (14.775, 0))
            Line((14.775, 0), (14.775, FILLET1_R))
        make_face()
    fillet1_piece_17b = revolve(axis=Axis((0, 2.5, 0), (0, 1, 0)), revolution_arc=7.866084762, mode=Mode.PRIVATE)
    fillet1_piece_17b = split(fillet1_piece_17b, bisect_by=Plane(origin=(-8.750942289, 2.556788399, -11.819130056), z_dir=(-0.8191520442889937, 0, 0.5735764363510434)), keep=Keep.TOP, mode=Mode.PRIVATE)
    fillet1_piece_17 = fillet1_piece_17a & fillet1_piece_17b
    add(fillet1_piece_17)

    # Chamfer1
    chamfer1_edges = [part.edges().sort_by_distance(p)[0] for p in [
        (7.384796618, 2.5, -10.54658257),
        (-7.384796618, 2.5, -10.54658257),
    ]]
    chamfer(chamfer1_edges, length=CHAMFER1_SIZE)


solid = part.part
